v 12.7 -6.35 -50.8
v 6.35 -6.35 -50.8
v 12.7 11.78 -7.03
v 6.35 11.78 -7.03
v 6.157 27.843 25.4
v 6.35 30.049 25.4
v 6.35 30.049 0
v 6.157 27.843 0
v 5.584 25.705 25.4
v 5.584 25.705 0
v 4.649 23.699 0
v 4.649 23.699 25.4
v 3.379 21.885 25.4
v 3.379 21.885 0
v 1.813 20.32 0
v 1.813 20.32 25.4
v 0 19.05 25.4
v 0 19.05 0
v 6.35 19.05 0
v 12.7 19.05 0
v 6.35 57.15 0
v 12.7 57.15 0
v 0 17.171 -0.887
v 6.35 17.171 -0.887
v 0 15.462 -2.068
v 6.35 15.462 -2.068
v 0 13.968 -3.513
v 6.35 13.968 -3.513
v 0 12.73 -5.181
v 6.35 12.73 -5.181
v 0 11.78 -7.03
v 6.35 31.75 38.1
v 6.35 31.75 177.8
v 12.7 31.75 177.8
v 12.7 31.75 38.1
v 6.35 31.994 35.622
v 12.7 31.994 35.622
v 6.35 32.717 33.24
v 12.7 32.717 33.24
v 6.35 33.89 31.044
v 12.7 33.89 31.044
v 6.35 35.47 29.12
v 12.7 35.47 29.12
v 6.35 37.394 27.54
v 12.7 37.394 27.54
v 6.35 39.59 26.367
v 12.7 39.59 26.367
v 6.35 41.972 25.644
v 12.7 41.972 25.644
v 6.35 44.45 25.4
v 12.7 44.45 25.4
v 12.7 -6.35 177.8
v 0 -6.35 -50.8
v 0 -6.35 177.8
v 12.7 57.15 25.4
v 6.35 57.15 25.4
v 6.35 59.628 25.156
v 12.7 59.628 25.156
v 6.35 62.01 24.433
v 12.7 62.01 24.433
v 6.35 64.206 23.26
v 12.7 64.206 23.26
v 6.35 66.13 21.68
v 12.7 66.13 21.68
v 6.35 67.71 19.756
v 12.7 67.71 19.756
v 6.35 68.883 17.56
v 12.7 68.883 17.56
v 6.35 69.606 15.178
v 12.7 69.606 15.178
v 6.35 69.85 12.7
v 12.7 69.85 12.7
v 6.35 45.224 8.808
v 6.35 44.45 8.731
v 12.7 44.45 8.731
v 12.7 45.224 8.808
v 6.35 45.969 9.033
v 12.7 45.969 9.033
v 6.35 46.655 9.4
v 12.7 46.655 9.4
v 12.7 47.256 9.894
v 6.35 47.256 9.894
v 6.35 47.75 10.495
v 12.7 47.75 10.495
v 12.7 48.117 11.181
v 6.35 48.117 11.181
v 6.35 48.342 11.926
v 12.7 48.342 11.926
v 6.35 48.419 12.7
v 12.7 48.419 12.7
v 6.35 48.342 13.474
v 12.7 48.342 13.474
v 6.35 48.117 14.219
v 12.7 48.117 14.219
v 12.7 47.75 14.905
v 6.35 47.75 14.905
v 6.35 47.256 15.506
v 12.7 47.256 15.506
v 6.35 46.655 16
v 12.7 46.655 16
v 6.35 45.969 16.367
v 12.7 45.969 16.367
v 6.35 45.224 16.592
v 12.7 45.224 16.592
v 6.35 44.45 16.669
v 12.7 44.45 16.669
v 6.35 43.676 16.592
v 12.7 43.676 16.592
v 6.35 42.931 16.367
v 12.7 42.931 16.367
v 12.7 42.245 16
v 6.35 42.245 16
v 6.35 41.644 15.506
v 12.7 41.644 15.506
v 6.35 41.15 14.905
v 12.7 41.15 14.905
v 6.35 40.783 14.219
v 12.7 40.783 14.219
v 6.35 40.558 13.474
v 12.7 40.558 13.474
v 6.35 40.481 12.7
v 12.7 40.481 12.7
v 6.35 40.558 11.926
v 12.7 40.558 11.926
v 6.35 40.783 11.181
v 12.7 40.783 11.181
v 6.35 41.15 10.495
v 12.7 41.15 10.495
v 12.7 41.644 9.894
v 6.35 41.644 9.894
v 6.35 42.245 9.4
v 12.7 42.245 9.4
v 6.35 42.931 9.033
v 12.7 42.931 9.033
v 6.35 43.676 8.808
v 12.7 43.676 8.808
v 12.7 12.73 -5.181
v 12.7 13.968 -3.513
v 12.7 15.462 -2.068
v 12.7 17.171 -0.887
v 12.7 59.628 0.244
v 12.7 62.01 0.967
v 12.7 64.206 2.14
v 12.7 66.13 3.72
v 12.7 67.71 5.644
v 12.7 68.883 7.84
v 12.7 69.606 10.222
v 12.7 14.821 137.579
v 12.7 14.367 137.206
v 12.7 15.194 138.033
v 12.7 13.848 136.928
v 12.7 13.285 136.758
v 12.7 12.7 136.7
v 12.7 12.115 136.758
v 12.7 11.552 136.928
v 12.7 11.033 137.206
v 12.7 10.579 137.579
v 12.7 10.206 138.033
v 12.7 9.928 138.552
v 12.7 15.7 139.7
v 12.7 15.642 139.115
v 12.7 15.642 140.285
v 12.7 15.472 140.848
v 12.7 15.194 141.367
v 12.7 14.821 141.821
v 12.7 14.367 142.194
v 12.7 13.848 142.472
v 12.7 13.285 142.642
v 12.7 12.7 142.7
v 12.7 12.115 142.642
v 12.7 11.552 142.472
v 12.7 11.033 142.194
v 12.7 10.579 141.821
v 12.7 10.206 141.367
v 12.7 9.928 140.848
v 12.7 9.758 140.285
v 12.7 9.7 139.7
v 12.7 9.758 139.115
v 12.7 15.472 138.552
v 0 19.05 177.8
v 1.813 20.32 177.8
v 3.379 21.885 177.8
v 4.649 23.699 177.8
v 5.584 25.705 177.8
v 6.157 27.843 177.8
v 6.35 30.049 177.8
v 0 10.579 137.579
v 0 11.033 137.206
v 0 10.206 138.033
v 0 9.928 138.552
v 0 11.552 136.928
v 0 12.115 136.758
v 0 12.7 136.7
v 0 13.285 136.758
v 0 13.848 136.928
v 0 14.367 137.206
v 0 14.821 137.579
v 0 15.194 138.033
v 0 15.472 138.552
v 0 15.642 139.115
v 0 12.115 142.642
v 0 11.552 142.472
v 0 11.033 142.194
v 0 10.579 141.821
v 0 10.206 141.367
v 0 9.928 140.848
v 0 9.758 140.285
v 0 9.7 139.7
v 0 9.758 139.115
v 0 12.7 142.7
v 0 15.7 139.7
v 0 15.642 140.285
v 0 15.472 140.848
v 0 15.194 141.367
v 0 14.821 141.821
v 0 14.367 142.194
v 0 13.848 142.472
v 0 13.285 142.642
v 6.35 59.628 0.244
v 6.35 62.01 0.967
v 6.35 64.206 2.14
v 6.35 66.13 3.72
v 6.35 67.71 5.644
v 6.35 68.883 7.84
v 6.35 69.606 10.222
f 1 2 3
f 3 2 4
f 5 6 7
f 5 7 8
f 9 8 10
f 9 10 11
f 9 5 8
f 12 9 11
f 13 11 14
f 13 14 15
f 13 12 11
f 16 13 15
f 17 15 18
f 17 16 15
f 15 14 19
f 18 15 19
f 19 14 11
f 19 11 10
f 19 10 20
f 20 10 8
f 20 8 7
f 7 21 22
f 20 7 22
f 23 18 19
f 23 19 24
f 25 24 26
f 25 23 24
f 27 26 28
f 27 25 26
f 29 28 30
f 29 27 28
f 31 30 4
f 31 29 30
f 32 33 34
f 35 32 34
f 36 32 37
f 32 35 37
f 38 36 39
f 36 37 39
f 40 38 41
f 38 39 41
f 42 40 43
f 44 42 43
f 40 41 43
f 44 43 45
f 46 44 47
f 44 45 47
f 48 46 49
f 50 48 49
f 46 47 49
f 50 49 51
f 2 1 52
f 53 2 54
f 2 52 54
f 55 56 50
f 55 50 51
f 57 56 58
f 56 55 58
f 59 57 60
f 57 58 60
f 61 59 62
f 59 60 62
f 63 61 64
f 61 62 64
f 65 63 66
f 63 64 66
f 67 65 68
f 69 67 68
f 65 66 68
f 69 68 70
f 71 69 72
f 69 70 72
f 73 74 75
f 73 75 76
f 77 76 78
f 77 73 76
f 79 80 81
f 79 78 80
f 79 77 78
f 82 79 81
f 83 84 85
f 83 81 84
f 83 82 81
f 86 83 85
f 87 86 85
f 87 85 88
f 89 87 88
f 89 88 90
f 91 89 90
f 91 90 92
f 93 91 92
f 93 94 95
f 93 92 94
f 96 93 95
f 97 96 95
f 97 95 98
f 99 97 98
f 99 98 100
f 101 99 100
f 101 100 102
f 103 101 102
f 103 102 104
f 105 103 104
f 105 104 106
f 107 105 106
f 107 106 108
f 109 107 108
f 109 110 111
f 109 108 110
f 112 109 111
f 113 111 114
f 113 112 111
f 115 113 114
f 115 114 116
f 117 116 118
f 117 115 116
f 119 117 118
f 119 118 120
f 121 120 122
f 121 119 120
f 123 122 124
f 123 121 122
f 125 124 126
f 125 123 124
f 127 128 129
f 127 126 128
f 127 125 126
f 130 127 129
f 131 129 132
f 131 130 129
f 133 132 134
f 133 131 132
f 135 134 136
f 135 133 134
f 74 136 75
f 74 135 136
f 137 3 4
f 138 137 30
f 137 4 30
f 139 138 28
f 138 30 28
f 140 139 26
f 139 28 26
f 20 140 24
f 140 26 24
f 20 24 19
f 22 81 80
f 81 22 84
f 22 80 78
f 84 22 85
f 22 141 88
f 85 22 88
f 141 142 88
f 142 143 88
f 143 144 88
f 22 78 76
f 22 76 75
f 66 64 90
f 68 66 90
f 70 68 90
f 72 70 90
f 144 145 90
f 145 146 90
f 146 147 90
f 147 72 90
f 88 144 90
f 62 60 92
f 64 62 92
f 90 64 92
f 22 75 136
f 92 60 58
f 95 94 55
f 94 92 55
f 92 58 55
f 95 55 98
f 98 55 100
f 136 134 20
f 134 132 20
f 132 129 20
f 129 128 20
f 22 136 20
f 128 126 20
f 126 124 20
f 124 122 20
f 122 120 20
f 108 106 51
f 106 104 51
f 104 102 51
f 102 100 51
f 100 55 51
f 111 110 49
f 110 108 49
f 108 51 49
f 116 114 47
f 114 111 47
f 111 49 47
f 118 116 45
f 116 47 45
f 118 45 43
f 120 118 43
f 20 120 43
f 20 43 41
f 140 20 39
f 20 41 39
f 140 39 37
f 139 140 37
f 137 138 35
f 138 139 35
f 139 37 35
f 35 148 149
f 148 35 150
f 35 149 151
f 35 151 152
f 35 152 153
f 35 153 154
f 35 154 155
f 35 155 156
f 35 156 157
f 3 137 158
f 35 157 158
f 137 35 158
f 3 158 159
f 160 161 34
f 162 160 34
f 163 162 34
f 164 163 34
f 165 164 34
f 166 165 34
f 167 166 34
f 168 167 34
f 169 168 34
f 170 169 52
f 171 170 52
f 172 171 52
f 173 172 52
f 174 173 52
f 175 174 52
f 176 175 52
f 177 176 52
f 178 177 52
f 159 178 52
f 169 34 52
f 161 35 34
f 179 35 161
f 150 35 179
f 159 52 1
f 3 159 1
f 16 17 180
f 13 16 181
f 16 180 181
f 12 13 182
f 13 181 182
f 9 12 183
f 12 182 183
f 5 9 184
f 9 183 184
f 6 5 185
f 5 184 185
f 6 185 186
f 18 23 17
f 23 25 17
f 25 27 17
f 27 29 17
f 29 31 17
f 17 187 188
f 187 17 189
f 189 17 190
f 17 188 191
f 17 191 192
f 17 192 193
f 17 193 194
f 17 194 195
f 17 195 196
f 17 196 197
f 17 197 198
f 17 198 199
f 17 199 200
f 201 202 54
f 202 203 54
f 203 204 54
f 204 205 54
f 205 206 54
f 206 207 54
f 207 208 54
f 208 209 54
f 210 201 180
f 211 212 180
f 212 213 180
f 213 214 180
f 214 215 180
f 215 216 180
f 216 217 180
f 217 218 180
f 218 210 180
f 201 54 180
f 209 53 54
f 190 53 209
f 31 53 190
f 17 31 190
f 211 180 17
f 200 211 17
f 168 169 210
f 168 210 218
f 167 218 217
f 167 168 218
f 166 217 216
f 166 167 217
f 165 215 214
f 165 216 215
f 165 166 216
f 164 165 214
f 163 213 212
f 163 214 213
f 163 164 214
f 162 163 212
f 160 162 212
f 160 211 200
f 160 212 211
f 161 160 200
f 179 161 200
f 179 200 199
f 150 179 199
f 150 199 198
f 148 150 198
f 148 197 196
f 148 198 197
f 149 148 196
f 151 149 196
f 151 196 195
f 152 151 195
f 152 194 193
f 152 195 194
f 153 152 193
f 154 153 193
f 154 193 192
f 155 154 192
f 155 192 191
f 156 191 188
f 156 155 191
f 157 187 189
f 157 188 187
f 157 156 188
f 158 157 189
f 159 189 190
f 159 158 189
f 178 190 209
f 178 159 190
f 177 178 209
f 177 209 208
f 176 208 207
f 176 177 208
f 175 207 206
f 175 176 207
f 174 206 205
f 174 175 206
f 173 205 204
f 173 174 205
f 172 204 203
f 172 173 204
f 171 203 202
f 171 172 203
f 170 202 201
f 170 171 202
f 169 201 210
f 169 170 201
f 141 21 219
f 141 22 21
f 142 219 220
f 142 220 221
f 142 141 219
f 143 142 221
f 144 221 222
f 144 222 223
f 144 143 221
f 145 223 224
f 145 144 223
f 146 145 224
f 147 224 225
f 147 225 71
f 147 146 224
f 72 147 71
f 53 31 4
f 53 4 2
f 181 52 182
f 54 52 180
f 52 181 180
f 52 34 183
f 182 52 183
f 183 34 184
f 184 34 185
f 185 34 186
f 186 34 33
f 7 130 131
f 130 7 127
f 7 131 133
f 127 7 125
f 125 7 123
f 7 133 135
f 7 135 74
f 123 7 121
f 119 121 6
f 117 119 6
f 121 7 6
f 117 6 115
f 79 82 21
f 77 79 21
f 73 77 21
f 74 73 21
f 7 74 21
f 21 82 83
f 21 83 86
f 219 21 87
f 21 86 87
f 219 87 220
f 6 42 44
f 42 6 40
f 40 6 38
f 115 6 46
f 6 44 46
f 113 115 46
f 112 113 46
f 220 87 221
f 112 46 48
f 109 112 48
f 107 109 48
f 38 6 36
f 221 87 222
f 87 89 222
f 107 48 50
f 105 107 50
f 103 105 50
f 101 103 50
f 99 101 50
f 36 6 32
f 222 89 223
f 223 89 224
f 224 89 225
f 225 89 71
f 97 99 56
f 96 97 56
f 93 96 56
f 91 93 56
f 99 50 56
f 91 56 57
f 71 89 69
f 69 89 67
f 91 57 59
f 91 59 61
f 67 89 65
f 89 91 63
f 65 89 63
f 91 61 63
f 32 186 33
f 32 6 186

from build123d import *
from build123d.topology import SkipClean

# Parameters (mm, degrees)
BOSS_EXTRUDE1_DEPTH     = 6.35
FILLET1_R               = 12.7
BOSS_EXTRUDE2_DEPTH     = 6.35
FILLET2_R               = 12.7
CUT_EXTRUDE1_DEPTH      = 88.298066989
CUT_EXTRUDE1_DEPTH_BACK = 88.298066989
SKETCH3_R               = 3.96875
FILLET3_R               = 12.7
BOSS_EXTRUDE3_START     = 152.4
BOSS_EXTRUDE3_DEPTH     = 152.4
FILLET4_R               = 12.7
CUT_EXTRUDE2_DEPTH      = 192.450130582
CUT_EXTRUDE2_DEPTH_BACK = 192.450130582
SKETCH5_R               = 3


# Some blends are built 0.0001 mm under size
with BuildPart() as part:
    # Sketch1 → Boss-Extrude1 (new body)
    with BuildSketch(Plane(origin=(0, 0, 0), x_dir=(0, 0, -1), z_dir=(1, 0, 0))):
        Polygon((0, 14.692048969), (50.8, -6.35), (-25.4, -6.35), (-25.4, 6.35), (-25.4, 19.05), (0, 19.05), align=None)
    extrude(amount=BOSS_EXTRUDE1_DEPTH)

    # Fillet1
    # the kernel refuses this fillet: 12.7 mm, written as the material it adds along each edge
    with BuildSketch(Plane(origin=(0, 14.692048969, 0), x_dir=(0, -0.38268343236508373, -0.9238795325112893), z_dir=(1, 0, 0))) as fillet1_piece_1:
        with BuildLine():
            CenterArc((7.608898544, 12.7), FILLET1_R, 223.076533416, 46.923466584)
            Line((-1.667715659, 4.026221762), (-1.853247943, 3.852746197))
            ThreePointArc((-1.853247943, 3.852746197), (-1.068523231, 1.915909289), (-0.234665401, -0.097201592))
            Line((-0.234665401, -0.097201592), (0, -0.254))
            Line((0, -0.254), (7.608898544, -0.254))
            Line((7.608898544, -0.254), (7.608898544, 0))
        make_face()
    extrude(amount=6.35)

    # Sketch2 → Boss-Extrude2 (add)
    with SkipClean():  # the faces are left unmerged after this step: merging them gives an invalid solid
        with BuildSketch(Plane(origin=(6.35, 0, 0), x_dir=(0, 0, -1), z_dir=(1, 0, 0))):
            with BuildLine():
                Line((0, 19.05), (0, 69.85))
                Line((0, 69.85), (-25.4, 69.85))
                Line((-25.4, 69.85), (-25.4, -6.35))
                Line((-25.4, -6.35), (50.8, -6.35))
                Line((50.8, -6.35), (7.02970563, 11.780249557))
                ThreePointArc((7.02970563, 11.780249557), (2.760063939, 14.685258788), (0, 19.05))
            make_face()
        extrude(amount=BOSS_EXTRUDE2_DEPTH)

    # Fillet2
    # the kernel refuses this fillet: 12.7 mm, written as the material it adds along each edge
    with BuildSketch(Plane(origin=(6.35, 19.05, 25.4), x_dir=(-1, 0, 0), z_dir=(0, 0, -1))) as fillet2_piece_1:
        with BuildLine():
            CenterArc((12.7, 10.998522628), FILLET2_R, 180, 60)
            Line((0, 10.998522628), (0, 0))
            Line((0, 0), (6.35, 0))
        make_face()
    extrude(amount=25.4)

    # Sketch3 → Cut-Extrude1 (cut, two sides: drawn at the far end of the back side and taken through both)
    with BuildSketch(Plane(origin=(12.7, 0, 0), x_dir=(0, 0, -1), z_dir=(1, 0, 0)).offset(-CUT_EXTRUDE1_DEPTH_BACK)):
        with Locations((-12.7, 44.45)):
            Circle(SKETCH3_R)
    extrude(amount=CUT_EXTRUDE1_DEPTH + CUT_EXTRUDE1_DEPTH_BACK, mode=Mode.SUBTRACT)

    # Fillet3
    fillet3_edges = [part.edges().sort_by_distance(p)[0] for p in [
        (9.525, 69.85, 0),
        (9.525, 69.85, 25.4),
    ]]
    fillet(fillet3_edges, radius=FILLET3_R - 0.0001)  # a hair under: the kernel refuses the full size

    # Sketch4 → Boss-Extrude3 (add)
    with BuildSketch(Plane.XY.offset(25.4).offset(BOSS_EXTRUDE3_START)):
        with BuildLine():
            Line((6.35, 30.048522628), (6.35, 31.75))
            Line((6.35, 31.75), (12.7, 31.75))
            Line((12.7, 31.75), (12.7, -6.35))
            Line((12.7, -6.35), (0, -6.35))
            Line((0, -6.35), (0, 19.05))
            ThreePointArc((0, 19.05), (4.648522628, 23.698522628), (6.35, 30.048522628))
        make_face()
    extrude(amount=-BOSS_EXTRUDE3_DEPTH)

    # Fillet4
    fillet4_edges = [part.edges().sort_by_distance(p)[0] for p in [
        (9.525, 31.75, 25.4),
    ]]
    fillet(fillet4_edges, radius=FILLET4_R)

    # Sketch5 → Cut-Extrude2 (cut, two sides: drawn at the far end of the back side and taken through both)
    with SkipClean():  # the faces are left unmerged after this step: merging them gives an invalid solid
        with BuildSketch(Plane.ZY.offset(-CUT_EXTRUDE2_DEPTH_BACK)):
            with Locations((139.7, 12.7)):
                Circle(SKETCH5_R)
        extrude(amount=CUT_EXTRUDE2_DEPTH + CUT_EXTRUDE2_DEPTH_BACK, mode=Mode.SUBTRACT)


solid = part.part
